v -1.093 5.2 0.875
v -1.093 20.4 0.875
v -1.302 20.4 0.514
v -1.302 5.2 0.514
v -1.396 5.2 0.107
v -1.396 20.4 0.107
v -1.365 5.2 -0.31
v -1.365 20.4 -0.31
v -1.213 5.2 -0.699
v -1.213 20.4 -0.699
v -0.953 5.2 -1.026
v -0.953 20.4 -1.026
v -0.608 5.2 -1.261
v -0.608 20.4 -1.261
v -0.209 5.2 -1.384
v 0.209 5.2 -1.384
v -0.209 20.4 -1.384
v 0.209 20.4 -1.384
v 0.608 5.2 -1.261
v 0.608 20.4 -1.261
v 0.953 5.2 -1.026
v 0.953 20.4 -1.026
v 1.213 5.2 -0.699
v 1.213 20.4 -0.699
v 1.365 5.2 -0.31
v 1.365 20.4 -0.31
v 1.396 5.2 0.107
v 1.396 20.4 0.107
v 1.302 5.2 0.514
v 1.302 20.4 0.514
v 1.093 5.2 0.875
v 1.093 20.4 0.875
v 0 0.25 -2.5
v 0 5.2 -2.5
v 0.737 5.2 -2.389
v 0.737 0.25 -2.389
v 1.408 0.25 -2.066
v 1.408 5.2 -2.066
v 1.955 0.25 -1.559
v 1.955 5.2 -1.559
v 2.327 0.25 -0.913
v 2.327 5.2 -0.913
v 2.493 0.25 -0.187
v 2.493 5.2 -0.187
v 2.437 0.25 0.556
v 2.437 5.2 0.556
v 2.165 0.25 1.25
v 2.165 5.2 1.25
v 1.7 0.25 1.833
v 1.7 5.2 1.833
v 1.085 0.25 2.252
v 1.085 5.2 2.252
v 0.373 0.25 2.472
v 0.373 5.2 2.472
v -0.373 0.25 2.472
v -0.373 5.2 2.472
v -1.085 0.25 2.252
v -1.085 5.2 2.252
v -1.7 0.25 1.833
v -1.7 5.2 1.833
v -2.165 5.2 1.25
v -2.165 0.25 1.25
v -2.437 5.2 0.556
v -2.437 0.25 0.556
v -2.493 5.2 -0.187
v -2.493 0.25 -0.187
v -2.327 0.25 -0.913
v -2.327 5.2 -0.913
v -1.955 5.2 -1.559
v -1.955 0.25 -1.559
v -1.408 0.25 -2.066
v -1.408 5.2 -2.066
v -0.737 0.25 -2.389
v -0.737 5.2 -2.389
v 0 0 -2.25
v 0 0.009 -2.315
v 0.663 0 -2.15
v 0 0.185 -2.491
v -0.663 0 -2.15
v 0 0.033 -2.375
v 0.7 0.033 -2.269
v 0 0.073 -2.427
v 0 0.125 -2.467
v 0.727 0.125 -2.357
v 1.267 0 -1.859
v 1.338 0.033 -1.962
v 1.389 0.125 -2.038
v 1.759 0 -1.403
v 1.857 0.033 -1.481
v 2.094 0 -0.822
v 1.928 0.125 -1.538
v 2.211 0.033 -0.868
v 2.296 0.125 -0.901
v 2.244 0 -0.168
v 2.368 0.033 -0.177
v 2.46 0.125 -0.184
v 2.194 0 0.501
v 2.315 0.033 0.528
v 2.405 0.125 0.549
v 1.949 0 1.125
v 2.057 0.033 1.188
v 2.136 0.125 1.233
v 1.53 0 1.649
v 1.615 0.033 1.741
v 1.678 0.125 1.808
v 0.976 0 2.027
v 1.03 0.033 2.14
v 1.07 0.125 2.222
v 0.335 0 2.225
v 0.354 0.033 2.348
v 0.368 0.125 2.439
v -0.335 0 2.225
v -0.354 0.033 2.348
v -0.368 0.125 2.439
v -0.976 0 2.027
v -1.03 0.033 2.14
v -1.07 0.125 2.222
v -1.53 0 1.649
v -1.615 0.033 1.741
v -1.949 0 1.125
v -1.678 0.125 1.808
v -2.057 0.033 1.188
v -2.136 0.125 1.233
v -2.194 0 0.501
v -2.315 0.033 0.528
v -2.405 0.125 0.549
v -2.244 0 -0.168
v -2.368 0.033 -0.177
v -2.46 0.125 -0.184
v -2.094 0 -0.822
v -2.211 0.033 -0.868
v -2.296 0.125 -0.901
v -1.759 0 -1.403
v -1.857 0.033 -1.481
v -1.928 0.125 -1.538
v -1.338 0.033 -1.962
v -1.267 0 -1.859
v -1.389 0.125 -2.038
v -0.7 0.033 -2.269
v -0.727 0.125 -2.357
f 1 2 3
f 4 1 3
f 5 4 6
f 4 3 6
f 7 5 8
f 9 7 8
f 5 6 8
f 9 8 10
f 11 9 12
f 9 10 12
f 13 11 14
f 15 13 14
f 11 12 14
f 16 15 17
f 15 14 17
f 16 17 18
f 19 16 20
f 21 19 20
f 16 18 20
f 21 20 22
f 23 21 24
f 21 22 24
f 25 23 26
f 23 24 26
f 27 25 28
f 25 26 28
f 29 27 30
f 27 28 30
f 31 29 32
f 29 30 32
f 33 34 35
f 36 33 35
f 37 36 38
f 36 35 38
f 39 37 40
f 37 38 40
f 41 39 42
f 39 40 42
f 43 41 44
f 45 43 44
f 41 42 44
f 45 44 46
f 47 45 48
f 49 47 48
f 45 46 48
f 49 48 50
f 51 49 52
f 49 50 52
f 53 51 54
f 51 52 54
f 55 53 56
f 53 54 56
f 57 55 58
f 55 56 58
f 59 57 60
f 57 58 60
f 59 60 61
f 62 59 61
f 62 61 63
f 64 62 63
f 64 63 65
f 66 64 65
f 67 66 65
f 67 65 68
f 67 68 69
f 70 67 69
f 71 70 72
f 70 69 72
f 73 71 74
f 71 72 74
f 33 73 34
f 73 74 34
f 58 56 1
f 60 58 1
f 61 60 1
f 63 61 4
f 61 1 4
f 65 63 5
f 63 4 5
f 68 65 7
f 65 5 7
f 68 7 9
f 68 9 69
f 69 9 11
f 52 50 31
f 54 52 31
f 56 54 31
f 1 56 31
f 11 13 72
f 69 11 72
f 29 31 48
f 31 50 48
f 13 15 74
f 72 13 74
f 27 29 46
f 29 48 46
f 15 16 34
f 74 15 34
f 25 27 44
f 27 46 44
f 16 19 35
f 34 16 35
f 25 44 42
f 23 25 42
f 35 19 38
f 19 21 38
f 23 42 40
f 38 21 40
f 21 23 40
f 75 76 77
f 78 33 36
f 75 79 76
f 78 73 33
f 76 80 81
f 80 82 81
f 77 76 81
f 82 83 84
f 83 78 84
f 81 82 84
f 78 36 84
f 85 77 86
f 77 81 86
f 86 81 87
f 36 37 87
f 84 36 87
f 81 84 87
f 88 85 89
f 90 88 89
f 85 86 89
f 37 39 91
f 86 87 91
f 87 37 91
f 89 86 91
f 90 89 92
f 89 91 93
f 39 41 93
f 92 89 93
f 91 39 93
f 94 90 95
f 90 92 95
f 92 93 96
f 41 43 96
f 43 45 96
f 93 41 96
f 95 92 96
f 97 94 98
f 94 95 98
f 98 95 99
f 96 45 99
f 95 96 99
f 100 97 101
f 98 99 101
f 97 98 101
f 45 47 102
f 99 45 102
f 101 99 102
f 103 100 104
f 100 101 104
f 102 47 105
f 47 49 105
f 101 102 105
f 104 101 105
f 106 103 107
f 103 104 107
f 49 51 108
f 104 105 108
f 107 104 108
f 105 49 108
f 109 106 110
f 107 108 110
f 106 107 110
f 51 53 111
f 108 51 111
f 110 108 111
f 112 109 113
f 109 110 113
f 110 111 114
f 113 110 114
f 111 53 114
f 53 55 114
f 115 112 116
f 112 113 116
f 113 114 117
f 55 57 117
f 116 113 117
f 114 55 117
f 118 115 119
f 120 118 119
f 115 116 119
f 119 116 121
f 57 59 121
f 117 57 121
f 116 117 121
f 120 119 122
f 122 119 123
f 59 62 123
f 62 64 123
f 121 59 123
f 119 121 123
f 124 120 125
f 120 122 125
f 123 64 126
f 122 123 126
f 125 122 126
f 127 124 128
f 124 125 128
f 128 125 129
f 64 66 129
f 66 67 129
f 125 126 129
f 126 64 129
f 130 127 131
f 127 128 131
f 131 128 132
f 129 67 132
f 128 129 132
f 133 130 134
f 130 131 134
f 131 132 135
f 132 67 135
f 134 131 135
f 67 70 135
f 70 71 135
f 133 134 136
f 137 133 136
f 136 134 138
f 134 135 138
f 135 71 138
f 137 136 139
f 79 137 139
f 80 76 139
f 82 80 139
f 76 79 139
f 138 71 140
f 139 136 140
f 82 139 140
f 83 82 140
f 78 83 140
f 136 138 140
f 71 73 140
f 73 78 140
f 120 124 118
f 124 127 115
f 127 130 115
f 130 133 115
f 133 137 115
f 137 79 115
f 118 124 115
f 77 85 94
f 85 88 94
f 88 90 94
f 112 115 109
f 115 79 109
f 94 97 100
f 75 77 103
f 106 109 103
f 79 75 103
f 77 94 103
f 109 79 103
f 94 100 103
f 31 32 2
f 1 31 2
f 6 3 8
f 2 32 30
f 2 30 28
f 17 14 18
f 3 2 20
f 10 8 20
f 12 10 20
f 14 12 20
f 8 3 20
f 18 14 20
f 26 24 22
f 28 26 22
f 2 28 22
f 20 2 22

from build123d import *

# Parameters (mm, degrees)
FILLET1_R          = 0.25
CUT_EXTRUDE1_DEPTH = 15.2


with BuildPart() as part:
    # Sketch2 → Revolve1 (revolve)
    with BuildSketch(Plane(origin=(0, 0, 0), x_dir=(0, 0, -1), z_dir=(1, 0, 0))):
        Polygon((0, 0), (2.5, 0), (2.5, 5.2), (1.4, 5.2), (1.4, 20.4), (0, 20.4), align=None)
    revolve(axis=Axis((0, 20.4, 0), (0, -1, 0)))

    # Fillet1
    fillet1_edges = [part.edges().sort_by_distance(p)[0] for p in [
        (0, 0, 2.5),
    ]]
    fillet(fillet1_edges, radius=FILLET1_R)

    # Sketch3 → Cut-Extrude1 (cut)
    with BuildSketch(Plane(origin=(0, 20.4, 0), x_dir=(1, 0, 0), z_dir=(0, 1, 0))):
        with BuildLine():
            Line((1.09287465, -0.875), (-1.09287465, -0.875))
            ThreePointArc((-1.09287465, -0.875), (0, -1.4), (1.09287465, -0.875))
        make_face()
    extrude(amount=-CUT_EXTRUDE1_DEPTH, mode=Mode.SUBTRACT)


solid = part.part
